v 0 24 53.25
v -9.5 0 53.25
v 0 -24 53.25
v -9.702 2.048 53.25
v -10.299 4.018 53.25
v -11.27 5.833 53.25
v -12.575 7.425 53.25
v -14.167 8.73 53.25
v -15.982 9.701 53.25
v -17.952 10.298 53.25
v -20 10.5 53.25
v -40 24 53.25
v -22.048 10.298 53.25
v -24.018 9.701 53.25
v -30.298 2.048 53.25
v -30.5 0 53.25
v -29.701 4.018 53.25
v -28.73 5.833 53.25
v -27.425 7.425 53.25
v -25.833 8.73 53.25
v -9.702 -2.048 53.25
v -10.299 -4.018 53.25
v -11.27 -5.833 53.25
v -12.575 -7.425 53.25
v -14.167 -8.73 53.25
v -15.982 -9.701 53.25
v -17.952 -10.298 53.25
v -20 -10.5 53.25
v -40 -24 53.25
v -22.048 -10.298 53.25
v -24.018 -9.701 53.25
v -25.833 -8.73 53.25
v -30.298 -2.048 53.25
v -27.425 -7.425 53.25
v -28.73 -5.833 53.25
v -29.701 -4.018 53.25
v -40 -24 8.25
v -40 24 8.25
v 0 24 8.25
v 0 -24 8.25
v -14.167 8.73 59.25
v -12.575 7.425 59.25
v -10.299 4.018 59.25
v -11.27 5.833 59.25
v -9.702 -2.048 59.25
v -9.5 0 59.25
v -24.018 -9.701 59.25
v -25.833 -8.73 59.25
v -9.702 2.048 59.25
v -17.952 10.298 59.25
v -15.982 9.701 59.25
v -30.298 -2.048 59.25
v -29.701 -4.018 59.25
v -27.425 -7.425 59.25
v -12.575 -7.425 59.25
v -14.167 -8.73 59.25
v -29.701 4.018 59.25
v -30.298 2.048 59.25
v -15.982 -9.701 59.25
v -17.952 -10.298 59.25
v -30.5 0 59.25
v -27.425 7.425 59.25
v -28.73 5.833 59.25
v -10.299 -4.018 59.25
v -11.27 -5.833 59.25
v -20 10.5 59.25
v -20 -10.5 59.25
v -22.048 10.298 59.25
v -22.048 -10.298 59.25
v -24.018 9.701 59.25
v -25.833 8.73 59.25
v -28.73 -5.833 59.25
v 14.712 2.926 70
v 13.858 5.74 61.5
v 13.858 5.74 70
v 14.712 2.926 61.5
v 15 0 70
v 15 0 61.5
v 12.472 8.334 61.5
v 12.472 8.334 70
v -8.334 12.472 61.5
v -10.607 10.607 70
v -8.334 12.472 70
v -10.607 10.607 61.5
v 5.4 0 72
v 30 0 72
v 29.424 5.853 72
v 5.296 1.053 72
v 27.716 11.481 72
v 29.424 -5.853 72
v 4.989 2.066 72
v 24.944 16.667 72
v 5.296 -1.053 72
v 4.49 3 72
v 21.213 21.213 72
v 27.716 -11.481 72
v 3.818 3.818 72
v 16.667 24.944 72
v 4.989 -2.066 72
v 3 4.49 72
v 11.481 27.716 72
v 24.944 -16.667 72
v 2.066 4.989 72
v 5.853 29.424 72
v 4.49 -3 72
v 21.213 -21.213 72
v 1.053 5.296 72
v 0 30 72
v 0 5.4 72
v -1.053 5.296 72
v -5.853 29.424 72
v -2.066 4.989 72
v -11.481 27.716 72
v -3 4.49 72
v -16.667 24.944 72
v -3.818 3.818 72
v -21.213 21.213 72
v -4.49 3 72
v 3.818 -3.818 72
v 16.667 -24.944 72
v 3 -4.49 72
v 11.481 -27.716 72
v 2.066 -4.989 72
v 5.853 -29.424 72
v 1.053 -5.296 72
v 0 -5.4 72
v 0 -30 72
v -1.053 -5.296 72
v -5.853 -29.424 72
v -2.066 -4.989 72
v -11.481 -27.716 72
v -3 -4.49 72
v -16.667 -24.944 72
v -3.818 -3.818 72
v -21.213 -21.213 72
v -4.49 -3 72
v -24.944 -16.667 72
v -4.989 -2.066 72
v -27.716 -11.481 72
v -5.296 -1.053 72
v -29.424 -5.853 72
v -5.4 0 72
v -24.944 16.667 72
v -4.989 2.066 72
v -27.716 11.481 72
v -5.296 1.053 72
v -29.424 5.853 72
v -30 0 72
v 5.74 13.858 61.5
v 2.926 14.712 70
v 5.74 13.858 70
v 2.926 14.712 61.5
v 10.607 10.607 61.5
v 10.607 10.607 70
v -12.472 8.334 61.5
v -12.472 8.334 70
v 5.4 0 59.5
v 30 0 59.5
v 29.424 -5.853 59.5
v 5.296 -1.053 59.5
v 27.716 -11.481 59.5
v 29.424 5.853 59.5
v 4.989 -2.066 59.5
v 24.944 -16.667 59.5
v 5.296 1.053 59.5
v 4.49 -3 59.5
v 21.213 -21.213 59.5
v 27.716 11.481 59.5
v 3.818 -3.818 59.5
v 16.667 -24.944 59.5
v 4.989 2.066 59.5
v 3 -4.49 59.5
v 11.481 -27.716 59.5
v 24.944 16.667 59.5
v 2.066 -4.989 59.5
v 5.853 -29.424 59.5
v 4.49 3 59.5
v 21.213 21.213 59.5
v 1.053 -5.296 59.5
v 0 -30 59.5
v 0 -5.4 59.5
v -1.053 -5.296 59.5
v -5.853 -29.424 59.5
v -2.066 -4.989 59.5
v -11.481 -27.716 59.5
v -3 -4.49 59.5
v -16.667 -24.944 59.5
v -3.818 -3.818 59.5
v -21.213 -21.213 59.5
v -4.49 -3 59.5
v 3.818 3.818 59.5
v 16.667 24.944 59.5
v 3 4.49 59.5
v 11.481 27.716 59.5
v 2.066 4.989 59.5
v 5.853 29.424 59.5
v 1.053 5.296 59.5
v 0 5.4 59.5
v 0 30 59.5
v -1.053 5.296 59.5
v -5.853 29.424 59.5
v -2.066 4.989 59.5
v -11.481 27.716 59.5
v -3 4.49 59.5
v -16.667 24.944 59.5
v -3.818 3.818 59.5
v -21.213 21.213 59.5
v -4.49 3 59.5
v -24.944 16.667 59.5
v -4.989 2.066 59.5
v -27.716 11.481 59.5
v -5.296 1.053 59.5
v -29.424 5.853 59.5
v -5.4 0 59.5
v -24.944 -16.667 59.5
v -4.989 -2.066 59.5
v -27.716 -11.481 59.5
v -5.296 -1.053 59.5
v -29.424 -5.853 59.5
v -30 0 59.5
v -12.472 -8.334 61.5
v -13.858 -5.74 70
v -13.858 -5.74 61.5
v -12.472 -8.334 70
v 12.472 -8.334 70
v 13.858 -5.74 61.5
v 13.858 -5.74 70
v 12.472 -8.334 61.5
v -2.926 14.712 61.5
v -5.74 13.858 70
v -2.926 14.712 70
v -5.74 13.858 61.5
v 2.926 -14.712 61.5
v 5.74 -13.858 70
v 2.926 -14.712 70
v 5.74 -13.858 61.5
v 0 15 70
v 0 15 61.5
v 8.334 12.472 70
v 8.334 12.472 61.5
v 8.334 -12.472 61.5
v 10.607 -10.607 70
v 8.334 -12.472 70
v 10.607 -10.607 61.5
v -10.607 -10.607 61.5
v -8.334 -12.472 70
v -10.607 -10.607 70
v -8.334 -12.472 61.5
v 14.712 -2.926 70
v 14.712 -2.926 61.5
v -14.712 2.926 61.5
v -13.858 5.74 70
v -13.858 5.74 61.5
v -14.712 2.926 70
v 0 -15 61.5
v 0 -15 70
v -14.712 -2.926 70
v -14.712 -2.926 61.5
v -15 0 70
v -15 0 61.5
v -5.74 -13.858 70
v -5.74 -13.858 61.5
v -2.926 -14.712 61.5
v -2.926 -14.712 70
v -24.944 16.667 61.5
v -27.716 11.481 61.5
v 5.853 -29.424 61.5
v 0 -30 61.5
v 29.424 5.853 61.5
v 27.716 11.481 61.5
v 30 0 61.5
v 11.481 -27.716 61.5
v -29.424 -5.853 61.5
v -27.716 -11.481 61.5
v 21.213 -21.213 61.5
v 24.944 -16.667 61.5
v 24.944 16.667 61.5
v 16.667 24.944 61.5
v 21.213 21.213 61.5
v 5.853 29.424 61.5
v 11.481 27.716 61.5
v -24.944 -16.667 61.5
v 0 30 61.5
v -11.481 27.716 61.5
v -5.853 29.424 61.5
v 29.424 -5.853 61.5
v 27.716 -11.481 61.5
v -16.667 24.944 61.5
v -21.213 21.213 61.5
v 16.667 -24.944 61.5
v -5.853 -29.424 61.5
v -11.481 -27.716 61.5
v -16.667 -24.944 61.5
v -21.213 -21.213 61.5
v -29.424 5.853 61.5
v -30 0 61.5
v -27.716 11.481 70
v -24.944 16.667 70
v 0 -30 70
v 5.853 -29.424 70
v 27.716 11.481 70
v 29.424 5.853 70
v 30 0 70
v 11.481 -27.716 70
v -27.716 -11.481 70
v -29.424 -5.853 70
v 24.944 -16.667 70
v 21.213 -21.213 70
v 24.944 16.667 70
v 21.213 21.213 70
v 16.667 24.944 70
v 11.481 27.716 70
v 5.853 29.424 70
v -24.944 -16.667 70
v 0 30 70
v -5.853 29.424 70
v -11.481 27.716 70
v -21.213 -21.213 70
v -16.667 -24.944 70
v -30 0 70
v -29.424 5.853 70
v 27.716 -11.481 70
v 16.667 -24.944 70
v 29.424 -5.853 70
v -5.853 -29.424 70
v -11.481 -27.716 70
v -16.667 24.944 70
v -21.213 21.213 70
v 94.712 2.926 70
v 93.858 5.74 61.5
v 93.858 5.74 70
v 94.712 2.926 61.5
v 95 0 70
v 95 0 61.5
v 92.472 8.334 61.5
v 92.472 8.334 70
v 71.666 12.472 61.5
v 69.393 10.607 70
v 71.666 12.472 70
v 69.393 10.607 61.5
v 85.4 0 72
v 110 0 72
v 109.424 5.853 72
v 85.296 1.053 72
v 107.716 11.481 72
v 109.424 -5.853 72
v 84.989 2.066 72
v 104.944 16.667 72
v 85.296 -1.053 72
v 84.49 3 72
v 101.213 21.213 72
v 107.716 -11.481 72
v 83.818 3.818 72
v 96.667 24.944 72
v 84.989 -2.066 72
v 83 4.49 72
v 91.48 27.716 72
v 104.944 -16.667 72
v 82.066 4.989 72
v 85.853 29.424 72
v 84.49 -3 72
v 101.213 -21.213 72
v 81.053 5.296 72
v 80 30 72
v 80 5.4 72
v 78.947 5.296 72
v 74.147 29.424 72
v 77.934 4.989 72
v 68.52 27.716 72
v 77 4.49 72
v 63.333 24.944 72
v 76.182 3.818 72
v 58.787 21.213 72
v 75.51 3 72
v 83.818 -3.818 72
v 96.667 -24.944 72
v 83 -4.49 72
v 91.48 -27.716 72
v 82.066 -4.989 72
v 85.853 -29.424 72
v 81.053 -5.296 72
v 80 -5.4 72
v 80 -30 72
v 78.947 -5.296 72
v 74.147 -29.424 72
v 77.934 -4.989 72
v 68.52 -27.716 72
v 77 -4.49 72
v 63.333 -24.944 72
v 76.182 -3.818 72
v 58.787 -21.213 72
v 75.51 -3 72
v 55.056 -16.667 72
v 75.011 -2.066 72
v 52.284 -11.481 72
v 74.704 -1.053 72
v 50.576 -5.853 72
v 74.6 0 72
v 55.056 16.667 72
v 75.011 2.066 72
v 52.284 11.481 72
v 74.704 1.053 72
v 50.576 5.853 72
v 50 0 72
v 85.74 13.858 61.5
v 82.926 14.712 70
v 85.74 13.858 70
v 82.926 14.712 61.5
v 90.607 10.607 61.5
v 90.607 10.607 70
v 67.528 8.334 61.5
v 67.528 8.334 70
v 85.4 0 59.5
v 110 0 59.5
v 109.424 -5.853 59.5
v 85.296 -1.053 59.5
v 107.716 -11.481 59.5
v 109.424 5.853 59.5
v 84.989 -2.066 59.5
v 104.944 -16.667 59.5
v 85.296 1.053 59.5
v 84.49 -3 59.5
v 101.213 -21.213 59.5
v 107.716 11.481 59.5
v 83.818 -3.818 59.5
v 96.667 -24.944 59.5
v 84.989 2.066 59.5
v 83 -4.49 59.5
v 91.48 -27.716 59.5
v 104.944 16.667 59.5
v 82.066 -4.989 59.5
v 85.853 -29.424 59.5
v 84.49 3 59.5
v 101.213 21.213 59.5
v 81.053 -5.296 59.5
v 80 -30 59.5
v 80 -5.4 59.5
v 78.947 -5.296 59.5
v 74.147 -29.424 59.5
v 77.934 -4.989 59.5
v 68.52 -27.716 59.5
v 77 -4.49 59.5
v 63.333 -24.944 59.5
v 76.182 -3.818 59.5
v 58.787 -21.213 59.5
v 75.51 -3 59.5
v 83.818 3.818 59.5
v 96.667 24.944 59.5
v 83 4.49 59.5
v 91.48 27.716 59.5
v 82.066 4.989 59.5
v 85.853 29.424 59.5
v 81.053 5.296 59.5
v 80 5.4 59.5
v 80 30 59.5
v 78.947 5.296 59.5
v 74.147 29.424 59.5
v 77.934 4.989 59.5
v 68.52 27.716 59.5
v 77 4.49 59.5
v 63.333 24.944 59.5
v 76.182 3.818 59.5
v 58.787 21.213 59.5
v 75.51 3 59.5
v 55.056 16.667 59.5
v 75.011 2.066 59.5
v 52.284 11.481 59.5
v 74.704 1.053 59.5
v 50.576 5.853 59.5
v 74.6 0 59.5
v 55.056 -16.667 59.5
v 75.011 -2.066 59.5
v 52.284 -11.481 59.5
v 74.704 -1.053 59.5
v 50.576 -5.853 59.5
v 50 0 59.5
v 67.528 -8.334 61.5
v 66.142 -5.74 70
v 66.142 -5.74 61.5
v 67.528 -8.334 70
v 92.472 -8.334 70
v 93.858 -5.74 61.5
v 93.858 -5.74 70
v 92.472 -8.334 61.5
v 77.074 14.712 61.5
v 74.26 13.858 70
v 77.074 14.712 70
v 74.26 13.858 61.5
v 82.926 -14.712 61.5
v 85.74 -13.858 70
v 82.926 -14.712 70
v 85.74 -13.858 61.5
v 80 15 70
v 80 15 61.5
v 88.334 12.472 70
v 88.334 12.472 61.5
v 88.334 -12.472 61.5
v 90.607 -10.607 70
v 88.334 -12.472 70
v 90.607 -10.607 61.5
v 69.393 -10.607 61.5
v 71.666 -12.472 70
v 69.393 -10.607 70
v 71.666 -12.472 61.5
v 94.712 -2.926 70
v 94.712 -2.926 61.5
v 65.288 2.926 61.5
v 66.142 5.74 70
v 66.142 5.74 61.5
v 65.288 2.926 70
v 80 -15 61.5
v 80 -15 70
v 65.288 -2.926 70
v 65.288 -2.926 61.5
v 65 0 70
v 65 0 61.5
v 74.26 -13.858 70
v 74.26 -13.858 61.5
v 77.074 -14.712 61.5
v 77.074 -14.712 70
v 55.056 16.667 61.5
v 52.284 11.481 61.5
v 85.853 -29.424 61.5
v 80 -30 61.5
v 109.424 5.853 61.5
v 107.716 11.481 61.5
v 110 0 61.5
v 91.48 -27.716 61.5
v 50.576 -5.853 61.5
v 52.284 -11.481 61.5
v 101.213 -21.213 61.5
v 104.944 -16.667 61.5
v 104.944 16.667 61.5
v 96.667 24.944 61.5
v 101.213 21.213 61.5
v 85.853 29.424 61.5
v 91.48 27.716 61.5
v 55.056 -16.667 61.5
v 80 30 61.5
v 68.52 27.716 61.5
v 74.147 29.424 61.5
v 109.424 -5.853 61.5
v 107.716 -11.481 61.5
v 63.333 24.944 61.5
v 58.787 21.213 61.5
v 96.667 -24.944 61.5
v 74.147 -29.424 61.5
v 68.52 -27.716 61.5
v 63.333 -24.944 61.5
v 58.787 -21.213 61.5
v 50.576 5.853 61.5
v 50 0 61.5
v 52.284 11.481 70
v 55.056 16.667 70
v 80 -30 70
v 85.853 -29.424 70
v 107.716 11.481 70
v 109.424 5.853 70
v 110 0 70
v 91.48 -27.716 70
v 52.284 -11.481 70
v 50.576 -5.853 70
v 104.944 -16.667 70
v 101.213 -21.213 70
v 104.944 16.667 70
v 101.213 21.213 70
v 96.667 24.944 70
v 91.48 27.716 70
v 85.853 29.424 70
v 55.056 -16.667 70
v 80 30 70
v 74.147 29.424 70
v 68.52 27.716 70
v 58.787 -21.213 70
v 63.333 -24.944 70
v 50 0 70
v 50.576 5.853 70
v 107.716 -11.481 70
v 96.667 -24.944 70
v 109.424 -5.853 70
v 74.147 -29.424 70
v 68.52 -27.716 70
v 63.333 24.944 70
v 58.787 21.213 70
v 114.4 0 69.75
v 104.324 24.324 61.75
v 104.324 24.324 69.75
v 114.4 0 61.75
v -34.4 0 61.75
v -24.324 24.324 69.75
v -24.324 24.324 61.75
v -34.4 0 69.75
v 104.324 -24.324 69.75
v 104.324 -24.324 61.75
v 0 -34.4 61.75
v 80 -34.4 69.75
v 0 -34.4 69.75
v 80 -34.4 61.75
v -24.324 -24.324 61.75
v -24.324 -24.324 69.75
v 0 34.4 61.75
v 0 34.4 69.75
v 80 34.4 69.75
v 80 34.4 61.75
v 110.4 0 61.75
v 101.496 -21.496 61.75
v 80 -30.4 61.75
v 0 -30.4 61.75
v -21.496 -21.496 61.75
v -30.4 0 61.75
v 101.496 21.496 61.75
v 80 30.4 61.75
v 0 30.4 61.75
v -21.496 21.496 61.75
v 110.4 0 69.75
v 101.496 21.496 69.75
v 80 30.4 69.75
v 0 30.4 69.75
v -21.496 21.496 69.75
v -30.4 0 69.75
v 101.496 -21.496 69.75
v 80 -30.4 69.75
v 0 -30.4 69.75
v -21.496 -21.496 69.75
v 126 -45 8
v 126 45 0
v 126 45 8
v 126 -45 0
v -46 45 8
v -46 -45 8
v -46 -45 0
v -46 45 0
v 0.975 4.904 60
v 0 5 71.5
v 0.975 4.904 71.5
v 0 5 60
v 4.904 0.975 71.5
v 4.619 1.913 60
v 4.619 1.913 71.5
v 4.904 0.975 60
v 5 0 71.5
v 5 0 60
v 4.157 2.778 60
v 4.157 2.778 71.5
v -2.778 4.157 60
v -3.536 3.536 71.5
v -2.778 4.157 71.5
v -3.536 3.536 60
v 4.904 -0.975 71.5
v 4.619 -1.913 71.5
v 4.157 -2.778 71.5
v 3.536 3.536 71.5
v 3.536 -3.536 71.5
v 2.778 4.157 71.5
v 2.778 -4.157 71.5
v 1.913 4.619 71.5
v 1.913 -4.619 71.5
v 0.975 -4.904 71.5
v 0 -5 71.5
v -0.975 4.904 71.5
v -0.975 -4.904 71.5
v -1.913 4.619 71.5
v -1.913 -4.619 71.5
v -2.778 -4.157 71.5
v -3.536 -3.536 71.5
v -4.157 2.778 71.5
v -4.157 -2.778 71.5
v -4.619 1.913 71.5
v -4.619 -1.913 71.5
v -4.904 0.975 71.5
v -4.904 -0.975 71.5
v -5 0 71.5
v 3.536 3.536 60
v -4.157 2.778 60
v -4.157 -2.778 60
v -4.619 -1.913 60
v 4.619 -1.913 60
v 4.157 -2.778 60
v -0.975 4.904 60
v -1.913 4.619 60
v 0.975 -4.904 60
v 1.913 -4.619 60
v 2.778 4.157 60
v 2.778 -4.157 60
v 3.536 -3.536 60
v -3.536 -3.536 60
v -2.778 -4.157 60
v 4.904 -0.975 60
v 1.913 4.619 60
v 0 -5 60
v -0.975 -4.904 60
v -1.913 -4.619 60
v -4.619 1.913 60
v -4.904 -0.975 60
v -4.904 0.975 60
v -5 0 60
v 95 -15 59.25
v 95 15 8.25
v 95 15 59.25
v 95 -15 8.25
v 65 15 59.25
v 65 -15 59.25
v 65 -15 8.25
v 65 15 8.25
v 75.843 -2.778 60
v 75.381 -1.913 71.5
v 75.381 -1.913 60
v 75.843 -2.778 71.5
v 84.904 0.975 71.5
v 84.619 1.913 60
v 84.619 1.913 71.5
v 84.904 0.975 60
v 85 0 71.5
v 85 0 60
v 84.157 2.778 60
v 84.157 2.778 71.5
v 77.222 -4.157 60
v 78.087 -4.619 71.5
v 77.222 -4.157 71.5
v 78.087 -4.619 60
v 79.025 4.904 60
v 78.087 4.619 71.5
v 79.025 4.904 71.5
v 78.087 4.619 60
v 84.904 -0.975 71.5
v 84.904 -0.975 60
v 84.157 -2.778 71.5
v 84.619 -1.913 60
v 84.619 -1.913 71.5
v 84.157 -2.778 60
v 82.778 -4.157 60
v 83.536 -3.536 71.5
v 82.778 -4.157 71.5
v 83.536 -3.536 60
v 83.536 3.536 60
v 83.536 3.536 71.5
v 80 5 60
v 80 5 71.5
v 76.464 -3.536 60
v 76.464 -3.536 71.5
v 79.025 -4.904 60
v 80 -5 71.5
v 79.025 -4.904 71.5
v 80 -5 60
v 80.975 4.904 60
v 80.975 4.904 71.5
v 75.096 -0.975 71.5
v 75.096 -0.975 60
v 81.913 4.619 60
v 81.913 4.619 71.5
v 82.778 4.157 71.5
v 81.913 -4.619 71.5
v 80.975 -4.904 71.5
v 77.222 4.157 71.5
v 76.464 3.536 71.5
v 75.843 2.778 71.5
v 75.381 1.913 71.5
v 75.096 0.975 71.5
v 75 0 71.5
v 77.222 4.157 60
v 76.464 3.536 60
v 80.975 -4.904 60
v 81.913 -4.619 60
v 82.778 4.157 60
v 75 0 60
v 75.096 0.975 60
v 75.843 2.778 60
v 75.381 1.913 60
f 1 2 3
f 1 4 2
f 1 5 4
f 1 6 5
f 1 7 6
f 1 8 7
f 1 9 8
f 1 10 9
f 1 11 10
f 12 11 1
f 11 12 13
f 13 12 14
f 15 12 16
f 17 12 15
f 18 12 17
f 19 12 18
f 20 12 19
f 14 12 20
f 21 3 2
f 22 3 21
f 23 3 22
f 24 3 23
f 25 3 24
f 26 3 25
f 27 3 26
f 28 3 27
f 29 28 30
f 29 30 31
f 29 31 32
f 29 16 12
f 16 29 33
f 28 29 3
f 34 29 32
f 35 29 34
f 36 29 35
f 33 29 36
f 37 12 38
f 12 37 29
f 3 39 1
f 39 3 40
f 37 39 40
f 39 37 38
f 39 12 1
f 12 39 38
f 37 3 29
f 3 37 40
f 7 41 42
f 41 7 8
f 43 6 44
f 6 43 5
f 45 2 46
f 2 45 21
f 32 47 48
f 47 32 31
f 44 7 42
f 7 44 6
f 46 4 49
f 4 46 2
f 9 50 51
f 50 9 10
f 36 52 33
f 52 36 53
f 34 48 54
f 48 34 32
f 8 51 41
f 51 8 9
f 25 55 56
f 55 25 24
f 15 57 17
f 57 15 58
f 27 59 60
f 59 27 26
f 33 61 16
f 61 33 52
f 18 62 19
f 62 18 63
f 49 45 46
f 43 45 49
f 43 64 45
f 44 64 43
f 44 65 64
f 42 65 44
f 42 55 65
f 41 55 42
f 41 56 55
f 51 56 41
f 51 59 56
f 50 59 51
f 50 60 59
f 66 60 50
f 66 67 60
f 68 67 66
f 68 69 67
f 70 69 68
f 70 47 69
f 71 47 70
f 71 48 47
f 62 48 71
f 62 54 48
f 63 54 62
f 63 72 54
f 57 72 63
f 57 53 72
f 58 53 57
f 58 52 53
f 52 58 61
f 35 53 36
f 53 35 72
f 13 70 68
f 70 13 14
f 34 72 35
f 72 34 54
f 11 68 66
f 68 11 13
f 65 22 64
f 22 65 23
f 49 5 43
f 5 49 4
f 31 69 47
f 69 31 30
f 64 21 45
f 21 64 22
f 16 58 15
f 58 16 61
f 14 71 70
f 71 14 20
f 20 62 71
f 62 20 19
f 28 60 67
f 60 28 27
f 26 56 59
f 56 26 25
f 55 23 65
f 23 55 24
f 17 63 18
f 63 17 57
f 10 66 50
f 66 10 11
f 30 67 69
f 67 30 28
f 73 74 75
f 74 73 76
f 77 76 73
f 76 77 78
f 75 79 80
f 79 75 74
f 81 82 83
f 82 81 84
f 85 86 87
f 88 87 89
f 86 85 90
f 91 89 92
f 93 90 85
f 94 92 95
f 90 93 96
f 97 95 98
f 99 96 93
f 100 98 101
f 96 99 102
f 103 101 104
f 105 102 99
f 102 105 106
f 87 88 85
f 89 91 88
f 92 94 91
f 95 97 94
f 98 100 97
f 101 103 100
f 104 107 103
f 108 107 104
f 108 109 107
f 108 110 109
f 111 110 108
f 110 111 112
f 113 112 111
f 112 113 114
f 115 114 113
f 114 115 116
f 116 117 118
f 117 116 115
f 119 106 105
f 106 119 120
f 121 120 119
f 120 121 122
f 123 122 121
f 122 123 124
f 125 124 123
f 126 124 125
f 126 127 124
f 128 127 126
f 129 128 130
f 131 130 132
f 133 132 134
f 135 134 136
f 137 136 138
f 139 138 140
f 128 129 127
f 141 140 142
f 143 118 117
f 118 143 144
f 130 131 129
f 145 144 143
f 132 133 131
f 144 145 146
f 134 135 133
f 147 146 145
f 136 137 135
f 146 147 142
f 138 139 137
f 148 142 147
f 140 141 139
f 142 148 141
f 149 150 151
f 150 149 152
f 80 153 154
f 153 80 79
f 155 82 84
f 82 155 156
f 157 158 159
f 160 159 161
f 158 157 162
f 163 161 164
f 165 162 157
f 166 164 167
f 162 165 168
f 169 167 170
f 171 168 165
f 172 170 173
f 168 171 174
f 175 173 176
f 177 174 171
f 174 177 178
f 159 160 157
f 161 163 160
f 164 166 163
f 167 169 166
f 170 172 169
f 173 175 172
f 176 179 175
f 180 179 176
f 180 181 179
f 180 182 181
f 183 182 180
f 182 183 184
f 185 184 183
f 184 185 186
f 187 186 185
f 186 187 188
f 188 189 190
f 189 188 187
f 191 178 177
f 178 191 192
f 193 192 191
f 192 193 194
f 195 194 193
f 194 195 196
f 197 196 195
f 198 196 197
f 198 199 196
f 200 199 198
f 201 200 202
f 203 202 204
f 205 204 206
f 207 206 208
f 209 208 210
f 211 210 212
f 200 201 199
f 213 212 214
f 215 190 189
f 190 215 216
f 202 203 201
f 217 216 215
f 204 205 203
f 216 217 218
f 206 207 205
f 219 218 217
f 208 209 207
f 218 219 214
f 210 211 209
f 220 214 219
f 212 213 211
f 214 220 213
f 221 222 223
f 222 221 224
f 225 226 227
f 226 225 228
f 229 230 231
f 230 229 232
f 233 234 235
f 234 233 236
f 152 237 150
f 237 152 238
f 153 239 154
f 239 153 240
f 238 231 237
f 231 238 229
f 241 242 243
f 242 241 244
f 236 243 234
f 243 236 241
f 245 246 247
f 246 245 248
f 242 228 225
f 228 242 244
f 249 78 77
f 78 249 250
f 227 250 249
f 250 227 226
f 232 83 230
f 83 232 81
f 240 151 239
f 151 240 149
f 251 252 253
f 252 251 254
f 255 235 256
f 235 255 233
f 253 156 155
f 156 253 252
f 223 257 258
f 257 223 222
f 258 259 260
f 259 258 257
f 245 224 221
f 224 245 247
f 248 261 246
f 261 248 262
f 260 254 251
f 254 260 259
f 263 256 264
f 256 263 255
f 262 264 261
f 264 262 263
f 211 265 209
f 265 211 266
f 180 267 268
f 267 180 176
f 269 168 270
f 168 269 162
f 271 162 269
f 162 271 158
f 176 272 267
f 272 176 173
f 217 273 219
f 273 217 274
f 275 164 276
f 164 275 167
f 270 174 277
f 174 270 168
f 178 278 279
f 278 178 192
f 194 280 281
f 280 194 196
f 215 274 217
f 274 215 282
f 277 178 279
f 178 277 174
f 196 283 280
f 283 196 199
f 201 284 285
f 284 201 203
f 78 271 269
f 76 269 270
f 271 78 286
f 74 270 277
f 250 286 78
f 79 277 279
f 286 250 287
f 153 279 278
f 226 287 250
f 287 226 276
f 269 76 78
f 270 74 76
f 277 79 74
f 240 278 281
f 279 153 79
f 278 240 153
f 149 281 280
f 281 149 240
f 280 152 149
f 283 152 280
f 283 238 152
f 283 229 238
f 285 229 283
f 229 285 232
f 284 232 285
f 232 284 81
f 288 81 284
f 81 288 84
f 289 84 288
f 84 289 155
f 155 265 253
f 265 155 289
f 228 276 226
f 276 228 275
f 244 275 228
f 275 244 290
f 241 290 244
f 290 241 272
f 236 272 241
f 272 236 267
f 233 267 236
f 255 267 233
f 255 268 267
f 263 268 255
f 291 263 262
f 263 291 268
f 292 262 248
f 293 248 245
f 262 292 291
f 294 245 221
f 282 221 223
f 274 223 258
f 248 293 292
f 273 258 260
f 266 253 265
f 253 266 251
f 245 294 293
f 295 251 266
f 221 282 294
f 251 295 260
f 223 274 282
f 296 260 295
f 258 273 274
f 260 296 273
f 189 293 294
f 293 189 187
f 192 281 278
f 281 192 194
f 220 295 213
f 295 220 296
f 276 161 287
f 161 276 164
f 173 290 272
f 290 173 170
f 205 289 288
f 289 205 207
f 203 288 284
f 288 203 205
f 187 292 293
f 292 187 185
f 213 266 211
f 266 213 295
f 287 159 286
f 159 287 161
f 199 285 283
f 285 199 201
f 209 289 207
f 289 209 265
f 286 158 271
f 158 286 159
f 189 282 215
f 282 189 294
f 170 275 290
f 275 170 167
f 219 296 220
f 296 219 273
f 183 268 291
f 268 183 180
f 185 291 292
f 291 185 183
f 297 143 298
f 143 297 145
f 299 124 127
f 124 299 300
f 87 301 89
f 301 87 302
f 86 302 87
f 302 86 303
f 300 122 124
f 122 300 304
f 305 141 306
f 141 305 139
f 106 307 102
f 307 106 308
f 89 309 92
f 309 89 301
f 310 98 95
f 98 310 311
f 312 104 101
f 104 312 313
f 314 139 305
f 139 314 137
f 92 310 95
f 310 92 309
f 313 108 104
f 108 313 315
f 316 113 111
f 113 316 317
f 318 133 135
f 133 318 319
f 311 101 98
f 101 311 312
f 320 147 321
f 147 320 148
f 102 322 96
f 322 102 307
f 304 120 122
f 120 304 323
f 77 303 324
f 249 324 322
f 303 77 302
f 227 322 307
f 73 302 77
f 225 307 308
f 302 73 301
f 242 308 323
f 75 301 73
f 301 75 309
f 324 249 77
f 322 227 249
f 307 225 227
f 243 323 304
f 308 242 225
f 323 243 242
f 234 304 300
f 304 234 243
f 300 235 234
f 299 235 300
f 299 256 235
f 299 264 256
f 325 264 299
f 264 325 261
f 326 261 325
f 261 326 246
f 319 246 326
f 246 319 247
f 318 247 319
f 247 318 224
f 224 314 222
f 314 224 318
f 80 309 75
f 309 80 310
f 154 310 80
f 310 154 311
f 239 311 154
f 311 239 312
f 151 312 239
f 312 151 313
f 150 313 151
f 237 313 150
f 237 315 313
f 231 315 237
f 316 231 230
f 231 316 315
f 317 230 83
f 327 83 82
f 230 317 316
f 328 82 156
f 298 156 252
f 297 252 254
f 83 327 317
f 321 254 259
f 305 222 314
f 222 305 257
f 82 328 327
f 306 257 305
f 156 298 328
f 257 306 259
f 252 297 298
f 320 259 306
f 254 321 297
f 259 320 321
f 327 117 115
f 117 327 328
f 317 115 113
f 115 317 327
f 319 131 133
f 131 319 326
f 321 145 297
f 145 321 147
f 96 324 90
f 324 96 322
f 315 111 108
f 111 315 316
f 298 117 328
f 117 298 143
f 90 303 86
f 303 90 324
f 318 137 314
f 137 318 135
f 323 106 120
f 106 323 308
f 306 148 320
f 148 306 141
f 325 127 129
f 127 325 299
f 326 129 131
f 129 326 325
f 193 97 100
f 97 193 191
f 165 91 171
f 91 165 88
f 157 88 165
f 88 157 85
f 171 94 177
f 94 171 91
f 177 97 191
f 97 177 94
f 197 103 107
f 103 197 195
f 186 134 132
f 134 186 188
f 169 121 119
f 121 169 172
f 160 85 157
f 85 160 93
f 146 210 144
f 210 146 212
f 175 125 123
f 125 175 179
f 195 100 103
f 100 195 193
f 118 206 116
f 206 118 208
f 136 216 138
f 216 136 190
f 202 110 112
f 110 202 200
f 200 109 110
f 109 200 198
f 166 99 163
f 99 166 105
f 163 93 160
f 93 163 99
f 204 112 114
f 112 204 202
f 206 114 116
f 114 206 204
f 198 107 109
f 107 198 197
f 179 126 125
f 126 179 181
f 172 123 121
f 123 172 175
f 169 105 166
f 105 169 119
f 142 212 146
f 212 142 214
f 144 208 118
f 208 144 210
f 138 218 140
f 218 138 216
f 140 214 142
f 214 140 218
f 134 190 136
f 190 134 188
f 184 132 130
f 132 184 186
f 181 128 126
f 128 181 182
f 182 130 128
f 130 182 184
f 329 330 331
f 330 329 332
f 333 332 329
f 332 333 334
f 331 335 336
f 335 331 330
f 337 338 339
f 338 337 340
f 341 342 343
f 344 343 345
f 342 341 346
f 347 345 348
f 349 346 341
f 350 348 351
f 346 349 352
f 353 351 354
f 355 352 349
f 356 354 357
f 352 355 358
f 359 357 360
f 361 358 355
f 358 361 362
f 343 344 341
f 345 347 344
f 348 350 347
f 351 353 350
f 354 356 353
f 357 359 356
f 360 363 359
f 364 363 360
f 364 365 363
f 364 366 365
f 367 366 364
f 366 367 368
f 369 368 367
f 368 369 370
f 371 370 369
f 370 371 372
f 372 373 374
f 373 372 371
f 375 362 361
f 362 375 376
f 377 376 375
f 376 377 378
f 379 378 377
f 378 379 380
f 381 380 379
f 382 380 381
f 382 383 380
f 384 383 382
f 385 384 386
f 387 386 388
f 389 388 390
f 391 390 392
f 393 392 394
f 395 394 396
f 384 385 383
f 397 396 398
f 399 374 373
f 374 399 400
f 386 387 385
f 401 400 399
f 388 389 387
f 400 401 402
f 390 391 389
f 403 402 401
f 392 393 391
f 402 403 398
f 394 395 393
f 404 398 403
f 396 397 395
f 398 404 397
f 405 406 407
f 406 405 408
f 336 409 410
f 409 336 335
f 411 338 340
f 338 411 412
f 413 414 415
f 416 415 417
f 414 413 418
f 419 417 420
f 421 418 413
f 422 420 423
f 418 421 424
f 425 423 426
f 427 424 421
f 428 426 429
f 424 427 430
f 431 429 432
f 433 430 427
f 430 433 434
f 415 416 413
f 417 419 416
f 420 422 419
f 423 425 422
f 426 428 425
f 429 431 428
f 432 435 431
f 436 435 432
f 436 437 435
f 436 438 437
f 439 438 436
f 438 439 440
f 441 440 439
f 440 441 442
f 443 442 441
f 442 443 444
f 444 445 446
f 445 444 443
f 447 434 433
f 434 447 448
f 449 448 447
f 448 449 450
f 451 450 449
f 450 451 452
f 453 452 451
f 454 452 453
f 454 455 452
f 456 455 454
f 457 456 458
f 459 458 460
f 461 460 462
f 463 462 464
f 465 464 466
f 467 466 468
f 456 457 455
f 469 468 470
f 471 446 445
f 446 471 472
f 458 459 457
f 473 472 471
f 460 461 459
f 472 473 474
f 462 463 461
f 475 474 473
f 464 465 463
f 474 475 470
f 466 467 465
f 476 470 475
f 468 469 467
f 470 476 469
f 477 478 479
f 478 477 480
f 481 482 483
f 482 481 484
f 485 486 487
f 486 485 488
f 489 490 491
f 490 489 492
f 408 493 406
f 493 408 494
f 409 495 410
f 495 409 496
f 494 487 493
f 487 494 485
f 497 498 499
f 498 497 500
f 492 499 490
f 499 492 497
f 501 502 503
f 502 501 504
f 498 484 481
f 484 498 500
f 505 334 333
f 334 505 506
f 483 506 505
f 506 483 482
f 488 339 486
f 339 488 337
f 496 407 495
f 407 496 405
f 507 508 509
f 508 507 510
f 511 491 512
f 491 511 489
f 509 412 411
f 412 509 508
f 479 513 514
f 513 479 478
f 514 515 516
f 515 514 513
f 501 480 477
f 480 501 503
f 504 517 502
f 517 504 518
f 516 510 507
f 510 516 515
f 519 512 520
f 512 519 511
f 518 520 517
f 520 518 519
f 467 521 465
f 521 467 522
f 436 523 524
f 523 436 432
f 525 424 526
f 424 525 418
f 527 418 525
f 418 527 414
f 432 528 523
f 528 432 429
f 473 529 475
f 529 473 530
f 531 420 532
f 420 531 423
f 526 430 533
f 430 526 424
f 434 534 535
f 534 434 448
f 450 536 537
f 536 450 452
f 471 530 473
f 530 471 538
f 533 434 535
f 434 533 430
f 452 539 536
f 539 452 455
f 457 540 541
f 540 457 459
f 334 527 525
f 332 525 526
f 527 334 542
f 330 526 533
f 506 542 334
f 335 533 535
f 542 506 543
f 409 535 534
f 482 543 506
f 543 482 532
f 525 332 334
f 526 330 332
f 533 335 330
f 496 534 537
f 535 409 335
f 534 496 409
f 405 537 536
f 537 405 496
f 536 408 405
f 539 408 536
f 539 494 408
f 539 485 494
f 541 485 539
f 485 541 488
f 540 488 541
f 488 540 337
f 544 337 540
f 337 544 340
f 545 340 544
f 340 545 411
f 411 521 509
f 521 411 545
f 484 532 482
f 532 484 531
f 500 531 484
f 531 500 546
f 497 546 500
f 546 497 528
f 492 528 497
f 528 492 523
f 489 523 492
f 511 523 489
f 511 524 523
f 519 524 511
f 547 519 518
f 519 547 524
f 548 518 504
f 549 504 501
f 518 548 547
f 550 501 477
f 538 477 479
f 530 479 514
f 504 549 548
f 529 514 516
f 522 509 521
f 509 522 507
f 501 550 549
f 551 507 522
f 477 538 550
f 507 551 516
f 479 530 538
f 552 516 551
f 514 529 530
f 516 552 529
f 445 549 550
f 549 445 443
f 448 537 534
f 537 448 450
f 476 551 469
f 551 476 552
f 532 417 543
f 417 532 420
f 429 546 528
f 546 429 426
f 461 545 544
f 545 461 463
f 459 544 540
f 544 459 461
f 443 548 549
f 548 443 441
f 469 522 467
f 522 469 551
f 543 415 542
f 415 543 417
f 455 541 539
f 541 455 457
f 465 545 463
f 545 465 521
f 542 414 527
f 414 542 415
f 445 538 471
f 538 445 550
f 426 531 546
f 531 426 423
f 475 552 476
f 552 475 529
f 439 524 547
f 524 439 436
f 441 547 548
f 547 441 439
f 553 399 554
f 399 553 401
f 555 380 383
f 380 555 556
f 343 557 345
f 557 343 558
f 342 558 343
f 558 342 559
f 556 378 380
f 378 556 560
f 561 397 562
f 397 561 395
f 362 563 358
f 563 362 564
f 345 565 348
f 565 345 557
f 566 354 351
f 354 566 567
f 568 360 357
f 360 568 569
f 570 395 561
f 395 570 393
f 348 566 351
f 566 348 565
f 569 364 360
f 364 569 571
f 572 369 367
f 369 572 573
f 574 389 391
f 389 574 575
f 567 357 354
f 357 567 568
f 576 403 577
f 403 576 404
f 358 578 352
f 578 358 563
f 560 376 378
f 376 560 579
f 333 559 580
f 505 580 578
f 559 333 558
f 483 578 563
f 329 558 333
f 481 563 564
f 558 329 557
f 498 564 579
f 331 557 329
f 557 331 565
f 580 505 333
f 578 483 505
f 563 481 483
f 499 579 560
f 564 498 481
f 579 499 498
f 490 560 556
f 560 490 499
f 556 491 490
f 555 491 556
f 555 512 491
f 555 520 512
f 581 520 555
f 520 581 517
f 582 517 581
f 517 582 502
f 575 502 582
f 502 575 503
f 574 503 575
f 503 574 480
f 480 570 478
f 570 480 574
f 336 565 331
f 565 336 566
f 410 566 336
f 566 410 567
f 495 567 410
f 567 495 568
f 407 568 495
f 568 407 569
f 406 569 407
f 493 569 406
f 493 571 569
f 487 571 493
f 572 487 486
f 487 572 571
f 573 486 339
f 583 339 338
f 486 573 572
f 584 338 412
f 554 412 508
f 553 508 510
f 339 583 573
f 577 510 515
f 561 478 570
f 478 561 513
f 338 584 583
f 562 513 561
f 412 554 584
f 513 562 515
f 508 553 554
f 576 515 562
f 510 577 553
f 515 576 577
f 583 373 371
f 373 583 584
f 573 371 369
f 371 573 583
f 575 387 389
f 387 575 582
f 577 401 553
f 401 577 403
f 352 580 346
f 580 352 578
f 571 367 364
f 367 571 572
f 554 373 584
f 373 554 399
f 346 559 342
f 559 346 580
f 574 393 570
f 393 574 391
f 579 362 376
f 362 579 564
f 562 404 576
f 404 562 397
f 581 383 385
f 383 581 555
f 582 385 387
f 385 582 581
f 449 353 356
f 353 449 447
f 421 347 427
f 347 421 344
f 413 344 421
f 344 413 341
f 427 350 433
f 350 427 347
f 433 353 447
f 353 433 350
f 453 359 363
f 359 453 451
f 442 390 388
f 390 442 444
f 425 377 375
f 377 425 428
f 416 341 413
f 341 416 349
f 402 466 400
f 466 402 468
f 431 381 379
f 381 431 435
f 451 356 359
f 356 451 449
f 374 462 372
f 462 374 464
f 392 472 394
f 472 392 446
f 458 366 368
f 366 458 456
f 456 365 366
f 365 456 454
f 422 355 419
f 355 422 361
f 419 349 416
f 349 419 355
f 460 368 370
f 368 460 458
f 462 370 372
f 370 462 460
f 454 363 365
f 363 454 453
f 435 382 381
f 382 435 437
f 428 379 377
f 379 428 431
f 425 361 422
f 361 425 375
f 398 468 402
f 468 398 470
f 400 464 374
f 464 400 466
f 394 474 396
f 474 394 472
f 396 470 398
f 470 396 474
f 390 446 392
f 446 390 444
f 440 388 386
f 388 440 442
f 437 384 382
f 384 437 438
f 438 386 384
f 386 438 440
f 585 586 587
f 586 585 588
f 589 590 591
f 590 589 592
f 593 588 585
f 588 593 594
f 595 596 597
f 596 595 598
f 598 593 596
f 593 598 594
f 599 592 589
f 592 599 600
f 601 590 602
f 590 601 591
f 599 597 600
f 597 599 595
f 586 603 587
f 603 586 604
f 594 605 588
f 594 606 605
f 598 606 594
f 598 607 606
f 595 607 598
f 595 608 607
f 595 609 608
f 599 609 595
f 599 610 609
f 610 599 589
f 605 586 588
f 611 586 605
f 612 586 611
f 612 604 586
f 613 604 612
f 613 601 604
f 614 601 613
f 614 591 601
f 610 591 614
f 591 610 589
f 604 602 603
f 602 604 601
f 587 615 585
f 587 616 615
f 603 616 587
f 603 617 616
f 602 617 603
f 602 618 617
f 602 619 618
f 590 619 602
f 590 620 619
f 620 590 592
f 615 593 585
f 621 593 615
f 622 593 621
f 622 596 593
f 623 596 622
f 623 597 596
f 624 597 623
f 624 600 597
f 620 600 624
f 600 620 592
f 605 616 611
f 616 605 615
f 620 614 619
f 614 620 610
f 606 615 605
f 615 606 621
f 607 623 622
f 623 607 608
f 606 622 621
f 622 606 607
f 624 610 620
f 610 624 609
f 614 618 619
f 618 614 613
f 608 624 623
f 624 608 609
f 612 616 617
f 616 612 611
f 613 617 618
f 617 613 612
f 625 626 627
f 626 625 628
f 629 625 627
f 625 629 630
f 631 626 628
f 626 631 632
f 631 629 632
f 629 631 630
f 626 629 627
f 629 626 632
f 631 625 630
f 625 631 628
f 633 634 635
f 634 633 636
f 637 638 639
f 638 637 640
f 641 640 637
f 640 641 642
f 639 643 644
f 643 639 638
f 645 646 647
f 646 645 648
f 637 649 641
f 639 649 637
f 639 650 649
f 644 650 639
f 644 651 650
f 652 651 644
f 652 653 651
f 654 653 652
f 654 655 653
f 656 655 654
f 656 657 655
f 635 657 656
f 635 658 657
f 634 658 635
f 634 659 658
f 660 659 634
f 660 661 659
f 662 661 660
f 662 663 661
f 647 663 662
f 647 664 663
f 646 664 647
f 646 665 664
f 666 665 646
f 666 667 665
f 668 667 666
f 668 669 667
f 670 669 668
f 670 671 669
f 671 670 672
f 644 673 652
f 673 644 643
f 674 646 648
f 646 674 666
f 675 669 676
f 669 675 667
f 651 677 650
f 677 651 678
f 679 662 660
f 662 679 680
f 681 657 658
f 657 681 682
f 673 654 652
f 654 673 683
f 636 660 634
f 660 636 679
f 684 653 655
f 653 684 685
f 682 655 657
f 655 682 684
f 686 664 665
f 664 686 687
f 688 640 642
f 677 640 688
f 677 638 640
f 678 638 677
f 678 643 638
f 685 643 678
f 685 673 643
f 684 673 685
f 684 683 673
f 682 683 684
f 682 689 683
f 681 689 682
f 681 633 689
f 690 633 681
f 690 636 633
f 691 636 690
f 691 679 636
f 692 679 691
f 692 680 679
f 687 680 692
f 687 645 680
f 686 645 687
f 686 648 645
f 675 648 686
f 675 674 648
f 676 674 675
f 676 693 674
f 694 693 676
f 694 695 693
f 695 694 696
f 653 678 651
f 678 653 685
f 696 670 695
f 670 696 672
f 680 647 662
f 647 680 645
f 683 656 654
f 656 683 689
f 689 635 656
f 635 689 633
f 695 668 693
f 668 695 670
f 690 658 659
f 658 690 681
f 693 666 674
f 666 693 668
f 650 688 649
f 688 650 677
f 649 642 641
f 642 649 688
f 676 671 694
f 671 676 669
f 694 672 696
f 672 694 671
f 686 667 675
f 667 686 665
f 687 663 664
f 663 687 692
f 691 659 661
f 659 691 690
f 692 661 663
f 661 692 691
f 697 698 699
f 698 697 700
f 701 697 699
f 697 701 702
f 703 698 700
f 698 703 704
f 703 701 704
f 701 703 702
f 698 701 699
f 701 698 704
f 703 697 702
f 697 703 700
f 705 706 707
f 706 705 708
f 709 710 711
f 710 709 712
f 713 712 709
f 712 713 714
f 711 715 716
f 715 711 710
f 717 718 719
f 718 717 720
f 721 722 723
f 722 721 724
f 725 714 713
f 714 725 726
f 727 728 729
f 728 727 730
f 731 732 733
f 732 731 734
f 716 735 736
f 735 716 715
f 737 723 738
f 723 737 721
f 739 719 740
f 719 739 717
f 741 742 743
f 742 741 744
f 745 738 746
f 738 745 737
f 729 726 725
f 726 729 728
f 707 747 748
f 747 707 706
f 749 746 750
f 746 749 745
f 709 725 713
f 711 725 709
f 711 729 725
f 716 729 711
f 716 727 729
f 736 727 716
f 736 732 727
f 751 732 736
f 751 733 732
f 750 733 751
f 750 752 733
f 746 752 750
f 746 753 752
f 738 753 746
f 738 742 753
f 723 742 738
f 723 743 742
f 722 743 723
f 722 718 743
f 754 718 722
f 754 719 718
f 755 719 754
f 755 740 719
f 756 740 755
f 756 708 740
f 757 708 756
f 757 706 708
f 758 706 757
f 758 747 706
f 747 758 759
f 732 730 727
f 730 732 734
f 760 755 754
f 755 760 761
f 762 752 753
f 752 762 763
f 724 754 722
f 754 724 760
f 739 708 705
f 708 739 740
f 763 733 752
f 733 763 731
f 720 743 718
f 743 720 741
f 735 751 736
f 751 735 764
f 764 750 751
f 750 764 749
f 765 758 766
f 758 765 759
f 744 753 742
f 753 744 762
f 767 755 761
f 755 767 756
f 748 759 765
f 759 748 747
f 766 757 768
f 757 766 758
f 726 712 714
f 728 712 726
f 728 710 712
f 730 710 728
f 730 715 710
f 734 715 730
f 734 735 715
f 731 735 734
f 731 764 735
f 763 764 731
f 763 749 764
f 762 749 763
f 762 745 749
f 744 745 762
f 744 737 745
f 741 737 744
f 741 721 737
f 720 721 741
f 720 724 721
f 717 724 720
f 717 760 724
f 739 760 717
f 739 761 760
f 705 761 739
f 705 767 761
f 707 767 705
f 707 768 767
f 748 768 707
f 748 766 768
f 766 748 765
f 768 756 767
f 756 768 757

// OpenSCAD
$fn = 32;

// ------------------------------------------------------------------------
// Motor belt drive: span 80 mm, pulleys d60, belt 8 mm wide
// Every part is its own module, assembly() places every instance.
// ------------------------------------------------------------------------

// --- part 1 ---
module base_plate() {
  difference() {
    translate([-86, -45, 0]) cube([172, 90, 8]);
  }
}

// --- part 2 ---
module motor() {
  union() {
    translate([-22.5, -24, 0]) cube([45, 48, 40]);
    translate([25.5, 0, 20]) rotate([0, 90, 0]) cylinder(h = 6, d = 21, center = true);
  }
}

// --- part 3 ---
module drive_shaft() {
  translate([0, 0, -5.75]) cylinder(h = 11.5, d = 10);
}

// --- part 4 ---
module pulley_drive() {
  difference() {
    union() {
      cylinder(h = 12.5, d = 30);
      cylinder(h = 2, d = 60);
      translate([0, 0, 10.5]) cylinder(h = 2, d = 60);
    }
    translate([0, 0, -1]) cylinder(h = 14.5, d = 10.8);
  }
}

// --- part 5 ---
module idler_post() {
  translate([-15, -15, 0]) cube([30, 30, 51]);
}

// --- part 6 ---
module driven_shaft() {
  translate([0, 0, -5.75]) cylinder(h = 11.5, d = 10);
}

// --- part 7 ---
module pulley_driven() {
  difference() {
    union() {
      cylinder(h = 12.5, d = 30);
      cylinder(h = 2, d = 60);
      translate([0, 0, 10.5]) cylinder(h = 2, d = 60);
    }
    translate([0, 0, -1]) cylinder(h = 14.5, d = 10.8);
  }
}

// --- part 8 ---
module drive_belt() {
  difference() {
    linear_extrude(height = 8) polygon(points = concat([for (a = [90 : 45 : 270]) [34.4 * cos(a), 34.4 * sin(a)]], [for (a = [270 : 45 : 450]) [80 + 34.4 * cos(a), 34.4 * sin(a)]]));
    translate([0, 0, -1]) linear_extrude(height = 10) polygon(points = concat([for (a = [90 : 45 : 270]) [30.4 * cos(a), 30.4 * sin(a)]], [for (a = [270 : 45 : 450]) [80 + 30.4 * cos(a), 30.4 * sin(a)]]));
  }
}

// --- assembly ---
module assembly() {
  color([0.80, 0.24, 0.20]) translate([40, 0, 0]) rotate([0, 0, 0]) base_plate();
  color([0.20, 0.45, 0.75]) translate([0, 0, 30.75]) rotate([0, 270, 0]) motor();
  color([0.25, 0.62, 0.32]) translate([0, 0, 65.75]) rotate([0, 0, 0]) drive_shaft();
  color([0.92, 0.70, 0.18]) translate([0, 0, 59.5]) rotate([0, 0, 0]) pulley_drive();
  color([0.58, 0.35, 0.70]) translate([80, 0, 8.25]) rotate([0, 0, 0]) idler_post();
  color([0.16, 0.66, 0.66]) translate([80, 0, 65.75]) rotate([0, 0, 0]) driven_shaft();
  color([0.85, 0.48, 0.18]) translate([80, 0, 59.5]) rotate([0, 0, 0]) pulley_driven();
  color([0.55, 0.60, 0.65]) translate([0, 0, 61.75]) rotate([0, 0, 0]) drive_belt();
}

assembly();
